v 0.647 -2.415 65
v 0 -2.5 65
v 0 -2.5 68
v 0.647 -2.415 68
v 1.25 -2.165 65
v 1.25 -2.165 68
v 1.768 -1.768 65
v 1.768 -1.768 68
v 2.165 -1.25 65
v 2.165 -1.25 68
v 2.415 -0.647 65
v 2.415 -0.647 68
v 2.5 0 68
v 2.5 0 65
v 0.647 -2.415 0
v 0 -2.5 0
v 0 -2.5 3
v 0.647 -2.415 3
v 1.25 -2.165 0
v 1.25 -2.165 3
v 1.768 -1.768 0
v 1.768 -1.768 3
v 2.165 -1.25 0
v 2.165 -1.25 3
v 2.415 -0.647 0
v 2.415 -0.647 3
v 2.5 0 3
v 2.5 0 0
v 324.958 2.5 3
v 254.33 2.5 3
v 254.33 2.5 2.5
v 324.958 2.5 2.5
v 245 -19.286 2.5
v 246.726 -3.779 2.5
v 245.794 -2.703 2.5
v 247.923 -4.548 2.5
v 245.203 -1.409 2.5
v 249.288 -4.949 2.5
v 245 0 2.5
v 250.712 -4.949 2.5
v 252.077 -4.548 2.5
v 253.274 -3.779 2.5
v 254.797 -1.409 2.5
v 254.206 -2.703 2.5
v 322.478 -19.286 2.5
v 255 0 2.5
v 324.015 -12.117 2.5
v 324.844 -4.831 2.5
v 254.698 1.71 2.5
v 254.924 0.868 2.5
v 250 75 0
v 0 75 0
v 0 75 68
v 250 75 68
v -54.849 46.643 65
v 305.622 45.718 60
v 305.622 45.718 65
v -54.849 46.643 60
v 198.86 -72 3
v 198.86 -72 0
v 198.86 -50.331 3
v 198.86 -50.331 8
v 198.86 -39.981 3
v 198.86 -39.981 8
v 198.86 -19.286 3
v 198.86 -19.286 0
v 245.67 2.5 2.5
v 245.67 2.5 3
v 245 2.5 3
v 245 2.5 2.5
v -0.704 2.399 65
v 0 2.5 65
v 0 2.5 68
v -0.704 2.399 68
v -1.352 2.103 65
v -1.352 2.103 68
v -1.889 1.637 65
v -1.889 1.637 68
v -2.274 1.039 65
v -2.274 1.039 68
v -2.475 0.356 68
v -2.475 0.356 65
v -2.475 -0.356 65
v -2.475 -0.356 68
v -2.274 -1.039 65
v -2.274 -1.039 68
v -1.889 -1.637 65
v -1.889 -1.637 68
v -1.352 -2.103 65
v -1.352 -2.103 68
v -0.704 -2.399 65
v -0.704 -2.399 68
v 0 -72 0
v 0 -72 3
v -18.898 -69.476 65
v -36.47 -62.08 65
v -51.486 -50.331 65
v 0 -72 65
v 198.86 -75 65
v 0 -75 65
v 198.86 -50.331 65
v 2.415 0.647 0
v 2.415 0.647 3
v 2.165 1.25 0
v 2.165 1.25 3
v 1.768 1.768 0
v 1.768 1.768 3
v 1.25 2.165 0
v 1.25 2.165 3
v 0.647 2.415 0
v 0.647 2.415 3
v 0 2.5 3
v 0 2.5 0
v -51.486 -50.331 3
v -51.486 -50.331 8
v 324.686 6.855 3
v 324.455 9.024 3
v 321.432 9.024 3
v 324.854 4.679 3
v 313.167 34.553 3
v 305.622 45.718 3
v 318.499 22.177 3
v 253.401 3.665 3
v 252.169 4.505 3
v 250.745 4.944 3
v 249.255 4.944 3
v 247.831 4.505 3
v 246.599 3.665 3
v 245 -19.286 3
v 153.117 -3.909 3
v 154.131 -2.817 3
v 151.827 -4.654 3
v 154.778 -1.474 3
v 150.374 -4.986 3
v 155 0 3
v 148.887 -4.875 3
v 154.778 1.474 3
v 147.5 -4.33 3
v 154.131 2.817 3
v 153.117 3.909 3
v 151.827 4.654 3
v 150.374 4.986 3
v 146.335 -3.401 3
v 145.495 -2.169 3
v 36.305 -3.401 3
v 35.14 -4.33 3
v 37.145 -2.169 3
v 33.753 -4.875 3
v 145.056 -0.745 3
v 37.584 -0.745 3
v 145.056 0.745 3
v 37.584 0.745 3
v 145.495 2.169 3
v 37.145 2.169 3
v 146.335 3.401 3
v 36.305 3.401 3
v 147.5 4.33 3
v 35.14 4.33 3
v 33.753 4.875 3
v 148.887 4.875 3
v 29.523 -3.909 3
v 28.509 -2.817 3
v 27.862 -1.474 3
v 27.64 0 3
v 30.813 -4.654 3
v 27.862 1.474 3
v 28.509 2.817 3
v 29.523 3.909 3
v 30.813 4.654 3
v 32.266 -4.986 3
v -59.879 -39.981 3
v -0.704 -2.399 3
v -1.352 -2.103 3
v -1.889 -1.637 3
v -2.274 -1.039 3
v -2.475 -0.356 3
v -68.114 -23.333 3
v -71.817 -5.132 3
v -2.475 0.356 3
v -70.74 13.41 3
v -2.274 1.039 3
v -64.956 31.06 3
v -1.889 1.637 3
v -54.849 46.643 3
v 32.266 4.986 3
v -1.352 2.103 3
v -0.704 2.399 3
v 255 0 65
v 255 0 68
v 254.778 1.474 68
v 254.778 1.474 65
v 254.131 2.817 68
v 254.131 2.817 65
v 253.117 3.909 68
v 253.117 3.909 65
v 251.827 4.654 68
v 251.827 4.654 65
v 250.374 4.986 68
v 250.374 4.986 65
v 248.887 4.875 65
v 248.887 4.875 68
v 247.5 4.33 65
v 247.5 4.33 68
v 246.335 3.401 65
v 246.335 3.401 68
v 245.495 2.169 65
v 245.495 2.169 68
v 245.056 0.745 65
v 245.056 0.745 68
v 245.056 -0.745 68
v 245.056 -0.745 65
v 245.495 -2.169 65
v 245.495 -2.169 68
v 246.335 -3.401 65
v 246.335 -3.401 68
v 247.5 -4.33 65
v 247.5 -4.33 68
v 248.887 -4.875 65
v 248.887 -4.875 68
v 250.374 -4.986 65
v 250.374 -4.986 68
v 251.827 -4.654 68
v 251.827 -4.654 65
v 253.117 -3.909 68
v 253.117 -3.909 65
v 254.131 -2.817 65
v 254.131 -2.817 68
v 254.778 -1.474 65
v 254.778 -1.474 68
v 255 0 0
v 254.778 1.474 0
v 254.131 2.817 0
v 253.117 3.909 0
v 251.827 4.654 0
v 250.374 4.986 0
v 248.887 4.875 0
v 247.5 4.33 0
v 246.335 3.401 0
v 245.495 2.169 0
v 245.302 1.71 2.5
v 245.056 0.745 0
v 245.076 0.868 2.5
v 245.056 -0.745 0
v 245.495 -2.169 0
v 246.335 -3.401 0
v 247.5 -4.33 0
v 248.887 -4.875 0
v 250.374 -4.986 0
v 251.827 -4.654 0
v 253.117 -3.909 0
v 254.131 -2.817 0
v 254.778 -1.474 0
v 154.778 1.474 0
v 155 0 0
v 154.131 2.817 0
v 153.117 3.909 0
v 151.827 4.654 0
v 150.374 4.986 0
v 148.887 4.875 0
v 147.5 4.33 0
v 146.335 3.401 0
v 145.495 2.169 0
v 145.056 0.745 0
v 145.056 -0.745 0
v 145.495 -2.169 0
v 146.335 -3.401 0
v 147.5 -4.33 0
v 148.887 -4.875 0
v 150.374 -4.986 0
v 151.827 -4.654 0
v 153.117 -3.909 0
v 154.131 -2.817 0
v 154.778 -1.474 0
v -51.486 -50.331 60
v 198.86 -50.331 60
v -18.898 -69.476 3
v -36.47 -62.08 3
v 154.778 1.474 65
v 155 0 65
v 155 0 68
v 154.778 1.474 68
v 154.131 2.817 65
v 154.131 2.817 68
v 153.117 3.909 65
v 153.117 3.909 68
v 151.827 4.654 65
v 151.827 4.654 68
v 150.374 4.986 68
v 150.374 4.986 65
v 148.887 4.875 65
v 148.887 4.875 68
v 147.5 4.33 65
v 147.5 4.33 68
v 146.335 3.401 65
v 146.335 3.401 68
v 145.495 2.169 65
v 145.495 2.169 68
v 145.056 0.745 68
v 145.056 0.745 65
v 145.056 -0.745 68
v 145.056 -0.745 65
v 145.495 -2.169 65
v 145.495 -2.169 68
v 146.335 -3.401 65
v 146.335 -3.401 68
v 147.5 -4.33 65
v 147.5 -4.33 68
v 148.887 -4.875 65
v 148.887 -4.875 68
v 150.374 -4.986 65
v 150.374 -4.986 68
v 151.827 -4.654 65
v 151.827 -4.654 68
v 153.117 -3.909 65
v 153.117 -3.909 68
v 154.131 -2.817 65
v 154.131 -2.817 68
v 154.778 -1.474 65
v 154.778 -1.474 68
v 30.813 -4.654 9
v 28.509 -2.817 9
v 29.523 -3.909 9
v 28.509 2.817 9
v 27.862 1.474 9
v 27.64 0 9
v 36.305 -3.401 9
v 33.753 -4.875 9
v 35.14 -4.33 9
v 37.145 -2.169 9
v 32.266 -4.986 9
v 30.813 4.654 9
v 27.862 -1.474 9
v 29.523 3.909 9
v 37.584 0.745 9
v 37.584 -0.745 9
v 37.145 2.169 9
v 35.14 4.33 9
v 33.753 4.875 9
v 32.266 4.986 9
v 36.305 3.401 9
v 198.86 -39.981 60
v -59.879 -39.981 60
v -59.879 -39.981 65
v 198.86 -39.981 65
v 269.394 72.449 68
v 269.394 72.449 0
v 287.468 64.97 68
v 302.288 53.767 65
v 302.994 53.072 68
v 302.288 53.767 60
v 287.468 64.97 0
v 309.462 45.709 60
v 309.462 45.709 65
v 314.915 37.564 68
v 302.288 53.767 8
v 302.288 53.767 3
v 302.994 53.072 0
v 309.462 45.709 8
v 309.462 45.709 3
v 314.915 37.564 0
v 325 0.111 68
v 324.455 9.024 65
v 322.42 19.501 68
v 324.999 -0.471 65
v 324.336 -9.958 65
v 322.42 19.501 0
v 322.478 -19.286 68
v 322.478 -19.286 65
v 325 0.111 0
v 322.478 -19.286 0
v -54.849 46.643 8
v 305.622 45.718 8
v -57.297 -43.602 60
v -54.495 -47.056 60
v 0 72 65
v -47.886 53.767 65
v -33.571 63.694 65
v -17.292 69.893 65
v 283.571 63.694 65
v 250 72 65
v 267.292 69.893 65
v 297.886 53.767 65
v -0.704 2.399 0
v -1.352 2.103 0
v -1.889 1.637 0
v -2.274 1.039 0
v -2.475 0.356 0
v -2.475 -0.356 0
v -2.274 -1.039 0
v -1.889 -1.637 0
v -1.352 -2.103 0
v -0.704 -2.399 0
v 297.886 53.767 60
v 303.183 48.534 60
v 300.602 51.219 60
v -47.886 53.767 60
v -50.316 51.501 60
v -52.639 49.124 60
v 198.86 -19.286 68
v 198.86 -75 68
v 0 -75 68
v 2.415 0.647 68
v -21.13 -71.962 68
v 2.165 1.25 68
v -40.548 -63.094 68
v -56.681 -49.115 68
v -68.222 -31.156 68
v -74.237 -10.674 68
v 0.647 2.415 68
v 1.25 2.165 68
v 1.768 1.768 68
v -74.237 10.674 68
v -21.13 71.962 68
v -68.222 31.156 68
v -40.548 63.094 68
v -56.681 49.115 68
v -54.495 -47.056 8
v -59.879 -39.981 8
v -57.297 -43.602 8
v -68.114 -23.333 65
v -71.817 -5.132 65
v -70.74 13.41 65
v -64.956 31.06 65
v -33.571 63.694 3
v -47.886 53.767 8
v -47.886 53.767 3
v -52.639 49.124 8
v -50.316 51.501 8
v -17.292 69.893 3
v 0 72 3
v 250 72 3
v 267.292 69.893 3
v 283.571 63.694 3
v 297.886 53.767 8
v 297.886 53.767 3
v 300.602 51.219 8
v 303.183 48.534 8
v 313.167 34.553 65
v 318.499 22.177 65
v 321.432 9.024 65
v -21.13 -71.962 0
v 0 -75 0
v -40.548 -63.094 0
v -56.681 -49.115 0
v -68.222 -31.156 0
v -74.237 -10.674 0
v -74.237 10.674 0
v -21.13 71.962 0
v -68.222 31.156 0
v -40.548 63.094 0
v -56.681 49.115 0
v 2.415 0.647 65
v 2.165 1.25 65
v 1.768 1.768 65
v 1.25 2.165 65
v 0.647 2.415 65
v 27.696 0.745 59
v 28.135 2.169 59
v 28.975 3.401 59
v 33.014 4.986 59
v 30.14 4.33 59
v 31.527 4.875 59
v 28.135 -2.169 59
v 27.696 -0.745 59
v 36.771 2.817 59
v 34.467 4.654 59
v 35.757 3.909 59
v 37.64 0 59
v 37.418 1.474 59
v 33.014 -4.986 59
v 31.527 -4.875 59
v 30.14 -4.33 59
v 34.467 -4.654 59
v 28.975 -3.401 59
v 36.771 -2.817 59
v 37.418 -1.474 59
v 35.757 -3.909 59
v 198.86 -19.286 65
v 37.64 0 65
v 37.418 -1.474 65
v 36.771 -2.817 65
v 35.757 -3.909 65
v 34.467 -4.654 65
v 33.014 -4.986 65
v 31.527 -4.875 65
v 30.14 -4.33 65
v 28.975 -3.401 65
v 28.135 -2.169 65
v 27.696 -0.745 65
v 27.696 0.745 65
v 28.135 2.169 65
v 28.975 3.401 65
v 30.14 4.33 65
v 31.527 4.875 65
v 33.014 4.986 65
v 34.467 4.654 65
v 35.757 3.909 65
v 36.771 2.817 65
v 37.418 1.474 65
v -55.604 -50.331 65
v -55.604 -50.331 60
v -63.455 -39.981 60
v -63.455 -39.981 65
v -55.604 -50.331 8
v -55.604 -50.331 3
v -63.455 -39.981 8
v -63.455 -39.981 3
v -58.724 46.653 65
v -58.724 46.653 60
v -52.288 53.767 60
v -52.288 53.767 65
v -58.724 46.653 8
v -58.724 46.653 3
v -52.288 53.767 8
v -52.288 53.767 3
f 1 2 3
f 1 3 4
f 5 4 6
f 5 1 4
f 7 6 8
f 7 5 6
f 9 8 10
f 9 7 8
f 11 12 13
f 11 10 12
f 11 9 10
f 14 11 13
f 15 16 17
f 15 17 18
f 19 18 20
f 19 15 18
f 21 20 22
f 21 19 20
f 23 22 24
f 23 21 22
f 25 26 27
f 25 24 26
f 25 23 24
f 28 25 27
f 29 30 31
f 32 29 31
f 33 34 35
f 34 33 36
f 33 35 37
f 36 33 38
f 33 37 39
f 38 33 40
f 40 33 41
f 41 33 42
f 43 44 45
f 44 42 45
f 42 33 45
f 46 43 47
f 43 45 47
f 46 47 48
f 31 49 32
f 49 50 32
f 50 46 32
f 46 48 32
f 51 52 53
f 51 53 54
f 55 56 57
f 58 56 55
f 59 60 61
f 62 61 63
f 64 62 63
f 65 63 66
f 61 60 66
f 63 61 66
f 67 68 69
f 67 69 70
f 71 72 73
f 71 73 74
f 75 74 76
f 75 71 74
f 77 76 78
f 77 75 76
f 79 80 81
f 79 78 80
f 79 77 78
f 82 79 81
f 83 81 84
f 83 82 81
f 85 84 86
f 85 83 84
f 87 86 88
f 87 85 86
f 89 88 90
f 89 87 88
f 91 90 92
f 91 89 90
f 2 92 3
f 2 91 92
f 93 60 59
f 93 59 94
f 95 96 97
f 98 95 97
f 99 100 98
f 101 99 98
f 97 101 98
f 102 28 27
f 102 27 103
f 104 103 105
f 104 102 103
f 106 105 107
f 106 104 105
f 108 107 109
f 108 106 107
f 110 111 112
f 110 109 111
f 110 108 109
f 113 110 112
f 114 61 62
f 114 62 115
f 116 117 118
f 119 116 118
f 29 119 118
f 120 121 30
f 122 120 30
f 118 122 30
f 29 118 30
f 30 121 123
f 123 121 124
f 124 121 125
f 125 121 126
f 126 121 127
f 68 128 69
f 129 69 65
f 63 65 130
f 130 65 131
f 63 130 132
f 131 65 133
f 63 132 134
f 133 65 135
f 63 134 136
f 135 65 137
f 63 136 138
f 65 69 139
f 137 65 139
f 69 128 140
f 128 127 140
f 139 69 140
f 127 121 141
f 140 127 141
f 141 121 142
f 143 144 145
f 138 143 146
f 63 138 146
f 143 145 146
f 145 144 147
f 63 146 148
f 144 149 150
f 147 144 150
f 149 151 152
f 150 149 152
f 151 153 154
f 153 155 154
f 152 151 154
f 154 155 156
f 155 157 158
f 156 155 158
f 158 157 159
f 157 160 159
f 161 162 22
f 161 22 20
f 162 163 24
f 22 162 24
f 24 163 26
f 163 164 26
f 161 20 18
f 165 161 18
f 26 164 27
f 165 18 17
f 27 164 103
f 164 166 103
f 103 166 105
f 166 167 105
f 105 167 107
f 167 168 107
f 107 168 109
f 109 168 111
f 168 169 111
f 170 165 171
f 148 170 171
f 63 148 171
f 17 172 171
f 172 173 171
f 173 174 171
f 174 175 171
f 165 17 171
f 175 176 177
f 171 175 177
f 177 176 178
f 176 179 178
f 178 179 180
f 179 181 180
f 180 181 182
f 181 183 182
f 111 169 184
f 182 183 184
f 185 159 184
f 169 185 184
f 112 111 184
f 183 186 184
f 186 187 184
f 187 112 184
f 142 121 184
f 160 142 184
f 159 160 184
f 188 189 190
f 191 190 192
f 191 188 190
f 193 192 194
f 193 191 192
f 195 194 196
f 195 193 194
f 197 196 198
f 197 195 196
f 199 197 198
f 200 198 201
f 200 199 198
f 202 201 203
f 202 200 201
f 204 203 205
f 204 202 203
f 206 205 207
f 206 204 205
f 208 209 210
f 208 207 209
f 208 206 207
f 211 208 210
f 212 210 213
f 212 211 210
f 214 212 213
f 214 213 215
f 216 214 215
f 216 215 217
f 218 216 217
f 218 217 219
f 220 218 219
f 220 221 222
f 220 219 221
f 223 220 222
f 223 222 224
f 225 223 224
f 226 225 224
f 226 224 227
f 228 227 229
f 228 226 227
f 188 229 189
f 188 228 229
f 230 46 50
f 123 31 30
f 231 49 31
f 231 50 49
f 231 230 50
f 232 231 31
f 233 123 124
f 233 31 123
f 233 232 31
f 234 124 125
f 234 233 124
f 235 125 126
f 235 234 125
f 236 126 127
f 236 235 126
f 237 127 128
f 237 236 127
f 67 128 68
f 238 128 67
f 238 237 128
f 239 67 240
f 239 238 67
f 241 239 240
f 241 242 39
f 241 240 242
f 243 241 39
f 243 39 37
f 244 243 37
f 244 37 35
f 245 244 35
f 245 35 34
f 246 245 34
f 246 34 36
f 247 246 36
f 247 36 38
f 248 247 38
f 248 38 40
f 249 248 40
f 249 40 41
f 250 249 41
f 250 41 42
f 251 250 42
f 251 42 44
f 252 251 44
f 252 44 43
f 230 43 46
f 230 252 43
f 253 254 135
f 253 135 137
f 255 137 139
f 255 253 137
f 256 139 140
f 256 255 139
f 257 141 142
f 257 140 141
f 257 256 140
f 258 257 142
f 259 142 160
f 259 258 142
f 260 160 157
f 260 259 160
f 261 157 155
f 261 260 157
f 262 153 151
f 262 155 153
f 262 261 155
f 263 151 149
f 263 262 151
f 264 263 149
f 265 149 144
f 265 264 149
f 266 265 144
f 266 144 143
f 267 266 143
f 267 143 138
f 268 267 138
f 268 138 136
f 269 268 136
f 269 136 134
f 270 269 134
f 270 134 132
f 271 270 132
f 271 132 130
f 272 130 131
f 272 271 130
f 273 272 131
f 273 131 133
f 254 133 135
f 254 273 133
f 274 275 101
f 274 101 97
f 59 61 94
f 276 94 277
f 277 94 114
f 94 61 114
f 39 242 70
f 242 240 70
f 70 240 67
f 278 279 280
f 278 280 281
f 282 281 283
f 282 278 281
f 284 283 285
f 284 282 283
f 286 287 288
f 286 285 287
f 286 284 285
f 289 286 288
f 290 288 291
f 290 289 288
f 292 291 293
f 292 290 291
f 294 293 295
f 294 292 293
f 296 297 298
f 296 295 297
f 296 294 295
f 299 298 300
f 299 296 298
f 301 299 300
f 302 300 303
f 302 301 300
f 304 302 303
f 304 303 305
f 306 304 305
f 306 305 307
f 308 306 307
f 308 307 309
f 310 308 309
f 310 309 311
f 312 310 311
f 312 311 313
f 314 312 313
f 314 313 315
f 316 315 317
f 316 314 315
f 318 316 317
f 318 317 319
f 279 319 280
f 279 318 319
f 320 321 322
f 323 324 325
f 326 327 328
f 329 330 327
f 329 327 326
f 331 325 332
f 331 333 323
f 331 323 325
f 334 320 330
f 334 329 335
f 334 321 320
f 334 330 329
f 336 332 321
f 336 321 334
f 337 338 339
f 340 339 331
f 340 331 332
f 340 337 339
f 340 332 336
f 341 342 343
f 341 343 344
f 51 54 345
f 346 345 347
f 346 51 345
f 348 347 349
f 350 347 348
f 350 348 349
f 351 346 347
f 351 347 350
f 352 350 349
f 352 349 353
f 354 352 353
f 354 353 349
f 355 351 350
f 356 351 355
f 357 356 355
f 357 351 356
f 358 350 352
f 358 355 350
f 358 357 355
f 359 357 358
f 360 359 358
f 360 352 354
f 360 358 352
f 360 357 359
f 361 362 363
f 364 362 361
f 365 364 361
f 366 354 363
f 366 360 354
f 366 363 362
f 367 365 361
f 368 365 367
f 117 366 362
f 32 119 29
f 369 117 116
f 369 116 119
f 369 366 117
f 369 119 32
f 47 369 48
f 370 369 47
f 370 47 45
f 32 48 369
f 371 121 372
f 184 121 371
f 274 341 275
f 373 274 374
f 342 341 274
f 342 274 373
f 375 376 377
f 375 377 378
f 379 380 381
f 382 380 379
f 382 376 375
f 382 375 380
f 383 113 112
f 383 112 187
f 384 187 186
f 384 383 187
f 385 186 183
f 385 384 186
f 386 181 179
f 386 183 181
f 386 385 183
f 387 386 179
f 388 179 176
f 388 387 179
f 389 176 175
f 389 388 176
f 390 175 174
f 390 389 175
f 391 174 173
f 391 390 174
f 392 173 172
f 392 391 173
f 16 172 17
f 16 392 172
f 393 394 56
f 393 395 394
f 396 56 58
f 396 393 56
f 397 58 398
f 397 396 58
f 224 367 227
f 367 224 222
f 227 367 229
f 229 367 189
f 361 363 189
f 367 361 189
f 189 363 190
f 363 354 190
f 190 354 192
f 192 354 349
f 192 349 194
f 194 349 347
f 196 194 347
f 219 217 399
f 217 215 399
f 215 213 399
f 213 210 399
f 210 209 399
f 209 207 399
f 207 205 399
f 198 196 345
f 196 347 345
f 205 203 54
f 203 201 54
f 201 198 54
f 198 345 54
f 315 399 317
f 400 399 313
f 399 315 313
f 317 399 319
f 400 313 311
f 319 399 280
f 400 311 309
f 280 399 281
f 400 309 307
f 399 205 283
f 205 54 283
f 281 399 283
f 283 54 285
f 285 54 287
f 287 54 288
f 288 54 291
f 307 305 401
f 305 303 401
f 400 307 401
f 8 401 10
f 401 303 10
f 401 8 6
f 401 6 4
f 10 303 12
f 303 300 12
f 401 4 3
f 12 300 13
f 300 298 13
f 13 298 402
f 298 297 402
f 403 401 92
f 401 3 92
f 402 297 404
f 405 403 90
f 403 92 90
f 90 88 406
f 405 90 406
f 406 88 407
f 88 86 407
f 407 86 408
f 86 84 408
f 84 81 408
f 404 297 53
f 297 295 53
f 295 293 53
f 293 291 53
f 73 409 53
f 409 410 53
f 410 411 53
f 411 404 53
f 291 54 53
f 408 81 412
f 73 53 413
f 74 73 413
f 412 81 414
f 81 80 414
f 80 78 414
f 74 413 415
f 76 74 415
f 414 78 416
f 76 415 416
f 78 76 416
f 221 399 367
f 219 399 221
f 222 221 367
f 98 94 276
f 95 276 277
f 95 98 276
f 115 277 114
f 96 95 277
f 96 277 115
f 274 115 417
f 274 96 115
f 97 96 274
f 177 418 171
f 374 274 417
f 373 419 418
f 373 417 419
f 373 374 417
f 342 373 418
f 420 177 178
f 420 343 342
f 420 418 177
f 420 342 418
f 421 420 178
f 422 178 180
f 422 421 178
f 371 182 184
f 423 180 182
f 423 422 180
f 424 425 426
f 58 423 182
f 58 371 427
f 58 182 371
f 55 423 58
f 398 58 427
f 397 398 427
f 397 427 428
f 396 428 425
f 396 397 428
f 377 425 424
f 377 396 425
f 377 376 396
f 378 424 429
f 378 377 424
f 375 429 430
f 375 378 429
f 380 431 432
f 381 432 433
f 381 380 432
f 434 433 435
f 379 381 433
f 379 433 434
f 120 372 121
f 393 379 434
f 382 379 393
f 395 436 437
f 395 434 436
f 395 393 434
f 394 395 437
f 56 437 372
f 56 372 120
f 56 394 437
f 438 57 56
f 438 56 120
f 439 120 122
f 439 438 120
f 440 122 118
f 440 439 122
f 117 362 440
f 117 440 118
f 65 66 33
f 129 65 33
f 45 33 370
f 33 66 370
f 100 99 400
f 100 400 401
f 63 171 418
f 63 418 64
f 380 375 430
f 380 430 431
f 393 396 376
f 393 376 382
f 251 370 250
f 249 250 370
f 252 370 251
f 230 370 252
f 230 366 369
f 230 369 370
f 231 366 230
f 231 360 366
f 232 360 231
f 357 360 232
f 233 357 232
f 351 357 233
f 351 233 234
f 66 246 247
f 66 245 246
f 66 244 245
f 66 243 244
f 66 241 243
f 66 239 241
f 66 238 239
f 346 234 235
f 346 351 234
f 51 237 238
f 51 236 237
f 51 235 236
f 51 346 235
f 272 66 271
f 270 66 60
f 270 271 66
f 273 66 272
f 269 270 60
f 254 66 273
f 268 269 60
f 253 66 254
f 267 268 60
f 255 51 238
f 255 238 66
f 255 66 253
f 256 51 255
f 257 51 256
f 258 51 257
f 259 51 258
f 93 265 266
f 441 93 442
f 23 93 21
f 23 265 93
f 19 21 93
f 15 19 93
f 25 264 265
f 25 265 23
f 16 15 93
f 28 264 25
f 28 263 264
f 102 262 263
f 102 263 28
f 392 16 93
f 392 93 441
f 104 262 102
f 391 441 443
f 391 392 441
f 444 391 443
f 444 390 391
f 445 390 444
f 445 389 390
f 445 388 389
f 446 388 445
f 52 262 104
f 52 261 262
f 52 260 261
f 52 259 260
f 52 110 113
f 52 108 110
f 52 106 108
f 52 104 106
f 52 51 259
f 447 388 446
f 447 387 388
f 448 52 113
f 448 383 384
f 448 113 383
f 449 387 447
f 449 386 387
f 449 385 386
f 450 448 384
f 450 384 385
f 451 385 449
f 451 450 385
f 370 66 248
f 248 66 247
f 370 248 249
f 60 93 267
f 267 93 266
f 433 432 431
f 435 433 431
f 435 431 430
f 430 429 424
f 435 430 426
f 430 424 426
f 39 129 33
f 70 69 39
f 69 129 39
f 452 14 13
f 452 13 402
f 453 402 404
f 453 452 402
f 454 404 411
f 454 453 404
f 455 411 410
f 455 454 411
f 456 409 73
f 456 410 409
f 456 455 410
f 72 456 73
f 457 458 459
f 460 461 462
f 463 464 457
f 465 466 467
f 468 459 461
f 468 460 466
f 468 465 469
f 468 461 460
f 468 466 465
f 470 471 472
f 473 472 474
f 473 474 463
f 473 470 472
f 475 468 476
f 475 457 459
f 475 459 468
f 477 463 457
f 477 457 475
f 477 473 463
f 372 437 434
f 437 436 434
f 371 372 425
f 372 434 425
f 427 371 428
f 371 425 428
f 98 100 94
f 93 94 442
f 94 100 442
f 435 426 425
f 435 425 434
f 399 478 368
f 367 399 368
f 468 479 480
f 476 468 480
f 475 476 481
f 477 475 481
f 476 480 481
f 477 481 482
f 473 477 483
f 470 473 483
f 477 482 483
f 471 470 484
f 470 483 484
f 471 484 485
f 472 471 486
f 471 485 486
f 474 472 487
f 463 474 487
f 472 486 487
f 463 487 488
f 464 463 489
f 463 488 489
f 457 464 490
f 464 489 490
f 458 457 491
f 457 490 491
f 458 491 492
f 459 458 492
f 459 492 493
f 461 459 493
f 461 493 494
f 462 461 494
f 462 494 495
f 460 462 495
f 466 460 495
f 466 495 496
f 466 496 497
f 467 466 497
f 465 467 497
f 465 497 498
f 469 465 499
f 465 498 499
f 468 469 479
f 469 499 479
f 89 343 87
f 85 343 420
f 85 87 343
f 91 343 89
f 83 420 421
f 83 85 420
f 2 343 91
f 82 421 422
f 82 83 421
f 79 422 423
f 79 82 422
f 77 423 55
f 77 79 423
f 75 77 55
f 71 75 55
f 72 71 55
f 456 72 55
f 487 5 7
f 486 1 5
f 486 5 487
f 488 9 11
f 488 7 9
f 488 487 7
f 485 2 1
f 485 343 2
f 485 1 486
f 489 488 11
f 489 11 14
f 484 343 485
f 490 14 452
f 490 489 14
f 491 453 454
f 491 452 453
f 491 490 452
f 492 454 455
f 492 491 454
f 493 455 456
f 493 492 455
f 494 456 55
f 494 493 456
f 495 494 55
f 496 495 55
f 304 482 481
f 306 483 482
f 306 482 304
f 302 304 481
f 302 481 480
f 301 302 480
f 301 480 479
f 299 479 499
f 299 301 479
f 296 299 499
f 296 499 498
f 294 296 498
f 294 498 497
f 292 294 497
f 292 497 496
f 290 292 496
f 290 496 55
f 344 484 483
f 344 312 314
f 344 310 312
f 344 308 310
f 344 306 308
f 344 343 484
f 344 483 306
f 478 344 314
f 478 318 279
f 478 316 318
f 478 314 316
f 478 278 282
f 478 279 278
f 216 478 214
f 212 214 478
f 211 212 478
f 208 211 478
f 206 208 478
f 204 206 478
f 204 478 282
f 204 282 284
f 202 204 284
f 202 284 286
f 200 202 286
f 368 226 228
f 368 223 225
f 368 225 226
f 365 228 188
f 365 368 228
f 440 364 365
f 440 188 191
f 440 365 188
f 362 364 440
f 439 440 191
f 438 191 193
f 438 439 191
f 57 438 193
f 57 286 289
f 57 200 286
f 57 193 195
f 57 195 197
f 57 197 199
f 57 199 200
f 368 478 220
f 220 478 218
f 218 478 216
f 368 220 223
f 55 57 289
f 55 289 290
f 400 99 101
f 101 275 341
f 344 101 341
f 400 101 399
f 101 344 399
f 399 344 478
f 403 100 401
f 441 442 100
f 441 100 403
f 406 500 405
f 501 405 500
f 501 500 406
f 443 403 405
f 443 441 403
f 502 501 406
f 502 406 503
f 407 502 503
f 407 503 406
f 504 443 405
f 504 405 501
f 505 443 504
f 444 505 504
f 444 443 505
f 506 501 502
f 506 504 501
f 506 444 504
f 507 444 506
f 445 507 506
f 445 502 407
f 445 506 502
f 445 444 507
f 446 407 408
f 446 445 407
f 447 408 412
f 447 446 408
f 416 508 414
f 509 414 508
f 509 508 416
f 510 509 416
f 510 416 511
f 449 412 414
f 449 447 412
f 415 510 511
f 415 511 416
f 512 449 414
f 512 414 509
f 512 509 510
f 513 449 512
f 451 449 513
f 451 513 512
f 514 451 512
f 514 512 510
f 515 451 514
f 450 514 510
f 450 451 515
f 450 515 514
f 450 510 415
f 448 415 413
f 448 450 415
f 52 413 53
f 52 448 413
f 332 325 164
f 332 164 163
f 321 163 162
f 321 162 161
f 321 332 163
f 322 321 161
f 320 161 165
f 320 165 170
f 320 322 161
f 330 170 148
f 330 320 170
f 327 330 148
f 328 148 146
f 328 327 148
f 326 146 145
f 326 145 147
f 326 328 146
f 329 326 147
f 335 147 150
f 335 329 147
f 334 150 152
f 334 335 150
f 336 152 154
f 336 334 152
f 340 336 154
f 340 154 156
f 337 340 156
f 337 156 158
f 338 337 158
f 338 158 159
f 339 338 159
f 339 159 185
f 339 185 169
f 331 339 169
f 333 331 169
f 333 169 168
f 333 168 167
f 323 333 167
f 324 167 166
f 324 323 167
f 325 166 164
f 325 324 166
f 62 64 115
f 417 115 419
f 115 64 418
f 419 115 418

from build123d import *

# Parameters (mm, degrees)
EXTRUDE_1_DEPTH          = 68
CUT_EXTRUDE_2_DEPTH      = 62
SKETCH_3_W               = 250
SKETCH_3_H               = 65
CUT_EXTRUDE_3_DEPTH      = 3
CUT_EXTRUDE_5_DEPTH      = 340.816126751
CUT_EXTRUDE_5_DEPTH_BACK = 340.816126751
CUT_EXTRUDE_6_DEPTH      = 340.816126751
CUT_EXTRUDE_6_DEPTH_BACK = 340.816126751
SKETCH_5_R               = 5
SKETCH_6_W               = 62.5
SKETCH_6_H               = 77.5
CUT_EXTRUDE_7_DEPTH      = 80
CUT_EXTRUDE_8_DEPTH      = 340.816126751
CUT_EXTRUDE_8_DEPTH_BACK = 340.816126751
SKETCH_7_W               = 123.617687057
SKETCH_7_H               = 55.714084123
SKETCH_8_R               = 5
EXTRUDE_2_DEPTH          = 6
EXTRUDE_START            = 6
EXTRUDE_3_DEPTH          = 6
EXTRUDE_4_DEPTH          = 5
PATTERN_LINEAR_1_COUNT   = 2
PATTERN_LINEAR_1_PITCH   = 57
SKETCH_12_W              = 62
SKETCH_12_H              = 9.024181297
CUT_EXTRUDE_9_DEPTH      = 10


with BuildPart() as part:
    # 草图1 → 凸台-拉伸1 (new body)
    with BuildSketch(Plane.XY):
        with BuildLine():
            Line((0, 75), (250, 75))
            ThreePointArc((250, 75), (325, 0), (250, -75))
            Line((250, -75), (0, -75))
            ThreePointArc((0, -75), (-75, 0), (0, 75))
        make_face()
    extrude(amount=EXTRUDE_1_DEPTH)

    # 草图2 → 切除-拉伸2 (cut)
    with BuildSketch(Plane.XY.offset(65)):
        with BuildLine():
            Line((0, 72), (250, 72))
            ThreePointArc((250, 72), (322, 0), (250, -72))
            Line((250, -72), (0, -72))
            ThreePointArc((0, -72), (-72, 0), (0, 72))
        make_face()
    extrude(amount=-CUT_EXTRUDE_2_DEPTH, mode=Mode.SUBTRACT)

    # 草图3 → 切除-拉伸3 (cut)
    with BuildSketch(Plane(origin=(0, -75, 0), x_dir=(-1, 0, 0), z_dir=(0, -1, 0))):
        with Locations((-125, -32.5)):
            Rectangle(SKETCH_3_W, SKETCH_3_H)
    extrude(amount=-CUT_EXTRUDE_3_DEPTH, mode=Mode.SUBTRACT)

    # 草图4 → 切除-拉伸5 (cut, two sides: drawn at the far end of the back side and taken through both)
    with BuildSketch(Plane.XY.offset(65).offset(-CUT_EXTRUDE_5_DEPTH_BACK)):
        with BuildLine():
            ThreePointArc((2.5, 0), (1.767766953, 1.767766953), (0, 2.5))
            Line((0, 2.5), (0, -2.5))
            ThreePointArc((0, -2.5), (1.767766953, -1.767766953), (2.5, 0))
        make_face()
        with BuildLine():
            Line((0, -2.5), (0, 2.5))
            ThreePointArc((0, 2.5), (-2.5, 0), (0, -2.5))
        make_face()
    extrude(amount=CUT_EXTRUDE_5_DEPTH + CUT_EXTRUDE_5_DEPTH_BACK, mode=Mode.SUBTRACT)

    # 草图5 → 切除-拉伸6 (cut, two sides: drawn at the far end of the back side and taken through both)
    with BuildSketch(Plane.XY.offset(65).offset(-CUT_EXTRUDE_6_DEPTH_BACK)):
        with Locations((250, 0)):
            Circle(SKETCH_5_R)
        with Locations((150, 0)):
            Circle(SKETCH_5_R)
    extrude(amount=CUT_EXTRUDE_6_DEPTH + CUT_EXTRUDE_6_DEPTH_BACK, mode=Mode.SUBTRACT)

    # 草图6 → 切除-拉伸7 (cut)
    with BuildSketch(Plane(origin=(325, 0, 0), x_dir=(0, 0, -1), z_dir=(1, 0, 0))):
        with Locations((-33.75, -36.25)):
            Rectangle(SKETCH_6_W, SKETCH_6_H)
    extrude(amount=-CUT_EXTRUDE_7_DEPTH, mode=Mode.SUBTRACT)

    # 草图7 → 切除-拉伸8 (cut, two sides: drawn at the far end of the back side and taken through both)
    with BuildSketch(Plane.XY.offset(65).offset(-CUT_EXTRUDE_8_DEPTH_BACK)):
        with Locations((260.669107939, -47.142957939)):
            Rectangle(SKETCH_7_W, SKETCH_7_H)
    extrude(amount=CUT_EXTRUDE_8_DEPTH + CUT_EXTRUDE_8_DEPTH_BACK, mode=Mode.SUBTRACT)

    # 草图8 → 凸台-拉伸2 (add)
    with BuildSketch(Plane(origin=(0, 0, 65), x_dir=(-1, 0, 0), z_dir=(0, 0, -1))):
        with Locations(Location((-32.64, 0, 0), (0, 0, 180))):
            Circle(SKETCH_8_R)
    extrude(amount=EXTRUDE_2_DEPTH)

    # 草图9 → 凸台-拉伸3 (add)
    with BuildSketch(Plane.XY.offset(3).offset(EXTRUDE_START)):
        with BuildLine():
            ThreePointArc((37.64, 0), (32.64, 5), (27.64, 0))
            Line((27.64, 0), (37.64, 0))
        make_face()
        with BuildLine():
            Line((37.64, 0), (27.64, 0))
            ThreePointArc((27.64, 0), (32.64, -5), (37.64, 0))
        make_face()
    extrude(amount=-EXTRUDE_3_DEPTH)

    # 草图10 → 凸台-拉伸4 (add)
    with BuildSketch(Plane.XY.offset(3)):
        Polygon((-52.288307715, 53.767396034), (302.288307715, 53.767396034), (309.461936105, 45.708622323), (-58.724061421, 46.652809243), align=None)
        Polygon((-63.45501943, -39.980751734), (198.86026441, -39.980751734), (198.86026441, -50.331270565), (-55.603625811, -50.331270565), align=None)
    extrude_4 = extrude(amount=EXTRUDE_4_DEPTH)

    # 阵列(线性)1: 凸台-拉伸4 ×2
    with Locations(*[(0, 0, i * PATTERN_LINEAR_1_PITCH) for i in range(1, PATTERN_LINEAR_1_COUNT)]):
        add(extrude_4)

    # 草图12 → 切除-拉伸9 (cut)
    with BuildSketch(Plane(origin=(325, 0, 0), x_dir=(0, 0, -1), z_dir=(1, 0, 0))):
        with Locations((-34, 4.512090649)):
            Rectangle(SKETCH_12_W, SKETCH_12_H)
    extrude(amount=-CUT_EXTRUDE_9_DEPTH, mode=Mode.SUBTRACT)


solid = part.part
